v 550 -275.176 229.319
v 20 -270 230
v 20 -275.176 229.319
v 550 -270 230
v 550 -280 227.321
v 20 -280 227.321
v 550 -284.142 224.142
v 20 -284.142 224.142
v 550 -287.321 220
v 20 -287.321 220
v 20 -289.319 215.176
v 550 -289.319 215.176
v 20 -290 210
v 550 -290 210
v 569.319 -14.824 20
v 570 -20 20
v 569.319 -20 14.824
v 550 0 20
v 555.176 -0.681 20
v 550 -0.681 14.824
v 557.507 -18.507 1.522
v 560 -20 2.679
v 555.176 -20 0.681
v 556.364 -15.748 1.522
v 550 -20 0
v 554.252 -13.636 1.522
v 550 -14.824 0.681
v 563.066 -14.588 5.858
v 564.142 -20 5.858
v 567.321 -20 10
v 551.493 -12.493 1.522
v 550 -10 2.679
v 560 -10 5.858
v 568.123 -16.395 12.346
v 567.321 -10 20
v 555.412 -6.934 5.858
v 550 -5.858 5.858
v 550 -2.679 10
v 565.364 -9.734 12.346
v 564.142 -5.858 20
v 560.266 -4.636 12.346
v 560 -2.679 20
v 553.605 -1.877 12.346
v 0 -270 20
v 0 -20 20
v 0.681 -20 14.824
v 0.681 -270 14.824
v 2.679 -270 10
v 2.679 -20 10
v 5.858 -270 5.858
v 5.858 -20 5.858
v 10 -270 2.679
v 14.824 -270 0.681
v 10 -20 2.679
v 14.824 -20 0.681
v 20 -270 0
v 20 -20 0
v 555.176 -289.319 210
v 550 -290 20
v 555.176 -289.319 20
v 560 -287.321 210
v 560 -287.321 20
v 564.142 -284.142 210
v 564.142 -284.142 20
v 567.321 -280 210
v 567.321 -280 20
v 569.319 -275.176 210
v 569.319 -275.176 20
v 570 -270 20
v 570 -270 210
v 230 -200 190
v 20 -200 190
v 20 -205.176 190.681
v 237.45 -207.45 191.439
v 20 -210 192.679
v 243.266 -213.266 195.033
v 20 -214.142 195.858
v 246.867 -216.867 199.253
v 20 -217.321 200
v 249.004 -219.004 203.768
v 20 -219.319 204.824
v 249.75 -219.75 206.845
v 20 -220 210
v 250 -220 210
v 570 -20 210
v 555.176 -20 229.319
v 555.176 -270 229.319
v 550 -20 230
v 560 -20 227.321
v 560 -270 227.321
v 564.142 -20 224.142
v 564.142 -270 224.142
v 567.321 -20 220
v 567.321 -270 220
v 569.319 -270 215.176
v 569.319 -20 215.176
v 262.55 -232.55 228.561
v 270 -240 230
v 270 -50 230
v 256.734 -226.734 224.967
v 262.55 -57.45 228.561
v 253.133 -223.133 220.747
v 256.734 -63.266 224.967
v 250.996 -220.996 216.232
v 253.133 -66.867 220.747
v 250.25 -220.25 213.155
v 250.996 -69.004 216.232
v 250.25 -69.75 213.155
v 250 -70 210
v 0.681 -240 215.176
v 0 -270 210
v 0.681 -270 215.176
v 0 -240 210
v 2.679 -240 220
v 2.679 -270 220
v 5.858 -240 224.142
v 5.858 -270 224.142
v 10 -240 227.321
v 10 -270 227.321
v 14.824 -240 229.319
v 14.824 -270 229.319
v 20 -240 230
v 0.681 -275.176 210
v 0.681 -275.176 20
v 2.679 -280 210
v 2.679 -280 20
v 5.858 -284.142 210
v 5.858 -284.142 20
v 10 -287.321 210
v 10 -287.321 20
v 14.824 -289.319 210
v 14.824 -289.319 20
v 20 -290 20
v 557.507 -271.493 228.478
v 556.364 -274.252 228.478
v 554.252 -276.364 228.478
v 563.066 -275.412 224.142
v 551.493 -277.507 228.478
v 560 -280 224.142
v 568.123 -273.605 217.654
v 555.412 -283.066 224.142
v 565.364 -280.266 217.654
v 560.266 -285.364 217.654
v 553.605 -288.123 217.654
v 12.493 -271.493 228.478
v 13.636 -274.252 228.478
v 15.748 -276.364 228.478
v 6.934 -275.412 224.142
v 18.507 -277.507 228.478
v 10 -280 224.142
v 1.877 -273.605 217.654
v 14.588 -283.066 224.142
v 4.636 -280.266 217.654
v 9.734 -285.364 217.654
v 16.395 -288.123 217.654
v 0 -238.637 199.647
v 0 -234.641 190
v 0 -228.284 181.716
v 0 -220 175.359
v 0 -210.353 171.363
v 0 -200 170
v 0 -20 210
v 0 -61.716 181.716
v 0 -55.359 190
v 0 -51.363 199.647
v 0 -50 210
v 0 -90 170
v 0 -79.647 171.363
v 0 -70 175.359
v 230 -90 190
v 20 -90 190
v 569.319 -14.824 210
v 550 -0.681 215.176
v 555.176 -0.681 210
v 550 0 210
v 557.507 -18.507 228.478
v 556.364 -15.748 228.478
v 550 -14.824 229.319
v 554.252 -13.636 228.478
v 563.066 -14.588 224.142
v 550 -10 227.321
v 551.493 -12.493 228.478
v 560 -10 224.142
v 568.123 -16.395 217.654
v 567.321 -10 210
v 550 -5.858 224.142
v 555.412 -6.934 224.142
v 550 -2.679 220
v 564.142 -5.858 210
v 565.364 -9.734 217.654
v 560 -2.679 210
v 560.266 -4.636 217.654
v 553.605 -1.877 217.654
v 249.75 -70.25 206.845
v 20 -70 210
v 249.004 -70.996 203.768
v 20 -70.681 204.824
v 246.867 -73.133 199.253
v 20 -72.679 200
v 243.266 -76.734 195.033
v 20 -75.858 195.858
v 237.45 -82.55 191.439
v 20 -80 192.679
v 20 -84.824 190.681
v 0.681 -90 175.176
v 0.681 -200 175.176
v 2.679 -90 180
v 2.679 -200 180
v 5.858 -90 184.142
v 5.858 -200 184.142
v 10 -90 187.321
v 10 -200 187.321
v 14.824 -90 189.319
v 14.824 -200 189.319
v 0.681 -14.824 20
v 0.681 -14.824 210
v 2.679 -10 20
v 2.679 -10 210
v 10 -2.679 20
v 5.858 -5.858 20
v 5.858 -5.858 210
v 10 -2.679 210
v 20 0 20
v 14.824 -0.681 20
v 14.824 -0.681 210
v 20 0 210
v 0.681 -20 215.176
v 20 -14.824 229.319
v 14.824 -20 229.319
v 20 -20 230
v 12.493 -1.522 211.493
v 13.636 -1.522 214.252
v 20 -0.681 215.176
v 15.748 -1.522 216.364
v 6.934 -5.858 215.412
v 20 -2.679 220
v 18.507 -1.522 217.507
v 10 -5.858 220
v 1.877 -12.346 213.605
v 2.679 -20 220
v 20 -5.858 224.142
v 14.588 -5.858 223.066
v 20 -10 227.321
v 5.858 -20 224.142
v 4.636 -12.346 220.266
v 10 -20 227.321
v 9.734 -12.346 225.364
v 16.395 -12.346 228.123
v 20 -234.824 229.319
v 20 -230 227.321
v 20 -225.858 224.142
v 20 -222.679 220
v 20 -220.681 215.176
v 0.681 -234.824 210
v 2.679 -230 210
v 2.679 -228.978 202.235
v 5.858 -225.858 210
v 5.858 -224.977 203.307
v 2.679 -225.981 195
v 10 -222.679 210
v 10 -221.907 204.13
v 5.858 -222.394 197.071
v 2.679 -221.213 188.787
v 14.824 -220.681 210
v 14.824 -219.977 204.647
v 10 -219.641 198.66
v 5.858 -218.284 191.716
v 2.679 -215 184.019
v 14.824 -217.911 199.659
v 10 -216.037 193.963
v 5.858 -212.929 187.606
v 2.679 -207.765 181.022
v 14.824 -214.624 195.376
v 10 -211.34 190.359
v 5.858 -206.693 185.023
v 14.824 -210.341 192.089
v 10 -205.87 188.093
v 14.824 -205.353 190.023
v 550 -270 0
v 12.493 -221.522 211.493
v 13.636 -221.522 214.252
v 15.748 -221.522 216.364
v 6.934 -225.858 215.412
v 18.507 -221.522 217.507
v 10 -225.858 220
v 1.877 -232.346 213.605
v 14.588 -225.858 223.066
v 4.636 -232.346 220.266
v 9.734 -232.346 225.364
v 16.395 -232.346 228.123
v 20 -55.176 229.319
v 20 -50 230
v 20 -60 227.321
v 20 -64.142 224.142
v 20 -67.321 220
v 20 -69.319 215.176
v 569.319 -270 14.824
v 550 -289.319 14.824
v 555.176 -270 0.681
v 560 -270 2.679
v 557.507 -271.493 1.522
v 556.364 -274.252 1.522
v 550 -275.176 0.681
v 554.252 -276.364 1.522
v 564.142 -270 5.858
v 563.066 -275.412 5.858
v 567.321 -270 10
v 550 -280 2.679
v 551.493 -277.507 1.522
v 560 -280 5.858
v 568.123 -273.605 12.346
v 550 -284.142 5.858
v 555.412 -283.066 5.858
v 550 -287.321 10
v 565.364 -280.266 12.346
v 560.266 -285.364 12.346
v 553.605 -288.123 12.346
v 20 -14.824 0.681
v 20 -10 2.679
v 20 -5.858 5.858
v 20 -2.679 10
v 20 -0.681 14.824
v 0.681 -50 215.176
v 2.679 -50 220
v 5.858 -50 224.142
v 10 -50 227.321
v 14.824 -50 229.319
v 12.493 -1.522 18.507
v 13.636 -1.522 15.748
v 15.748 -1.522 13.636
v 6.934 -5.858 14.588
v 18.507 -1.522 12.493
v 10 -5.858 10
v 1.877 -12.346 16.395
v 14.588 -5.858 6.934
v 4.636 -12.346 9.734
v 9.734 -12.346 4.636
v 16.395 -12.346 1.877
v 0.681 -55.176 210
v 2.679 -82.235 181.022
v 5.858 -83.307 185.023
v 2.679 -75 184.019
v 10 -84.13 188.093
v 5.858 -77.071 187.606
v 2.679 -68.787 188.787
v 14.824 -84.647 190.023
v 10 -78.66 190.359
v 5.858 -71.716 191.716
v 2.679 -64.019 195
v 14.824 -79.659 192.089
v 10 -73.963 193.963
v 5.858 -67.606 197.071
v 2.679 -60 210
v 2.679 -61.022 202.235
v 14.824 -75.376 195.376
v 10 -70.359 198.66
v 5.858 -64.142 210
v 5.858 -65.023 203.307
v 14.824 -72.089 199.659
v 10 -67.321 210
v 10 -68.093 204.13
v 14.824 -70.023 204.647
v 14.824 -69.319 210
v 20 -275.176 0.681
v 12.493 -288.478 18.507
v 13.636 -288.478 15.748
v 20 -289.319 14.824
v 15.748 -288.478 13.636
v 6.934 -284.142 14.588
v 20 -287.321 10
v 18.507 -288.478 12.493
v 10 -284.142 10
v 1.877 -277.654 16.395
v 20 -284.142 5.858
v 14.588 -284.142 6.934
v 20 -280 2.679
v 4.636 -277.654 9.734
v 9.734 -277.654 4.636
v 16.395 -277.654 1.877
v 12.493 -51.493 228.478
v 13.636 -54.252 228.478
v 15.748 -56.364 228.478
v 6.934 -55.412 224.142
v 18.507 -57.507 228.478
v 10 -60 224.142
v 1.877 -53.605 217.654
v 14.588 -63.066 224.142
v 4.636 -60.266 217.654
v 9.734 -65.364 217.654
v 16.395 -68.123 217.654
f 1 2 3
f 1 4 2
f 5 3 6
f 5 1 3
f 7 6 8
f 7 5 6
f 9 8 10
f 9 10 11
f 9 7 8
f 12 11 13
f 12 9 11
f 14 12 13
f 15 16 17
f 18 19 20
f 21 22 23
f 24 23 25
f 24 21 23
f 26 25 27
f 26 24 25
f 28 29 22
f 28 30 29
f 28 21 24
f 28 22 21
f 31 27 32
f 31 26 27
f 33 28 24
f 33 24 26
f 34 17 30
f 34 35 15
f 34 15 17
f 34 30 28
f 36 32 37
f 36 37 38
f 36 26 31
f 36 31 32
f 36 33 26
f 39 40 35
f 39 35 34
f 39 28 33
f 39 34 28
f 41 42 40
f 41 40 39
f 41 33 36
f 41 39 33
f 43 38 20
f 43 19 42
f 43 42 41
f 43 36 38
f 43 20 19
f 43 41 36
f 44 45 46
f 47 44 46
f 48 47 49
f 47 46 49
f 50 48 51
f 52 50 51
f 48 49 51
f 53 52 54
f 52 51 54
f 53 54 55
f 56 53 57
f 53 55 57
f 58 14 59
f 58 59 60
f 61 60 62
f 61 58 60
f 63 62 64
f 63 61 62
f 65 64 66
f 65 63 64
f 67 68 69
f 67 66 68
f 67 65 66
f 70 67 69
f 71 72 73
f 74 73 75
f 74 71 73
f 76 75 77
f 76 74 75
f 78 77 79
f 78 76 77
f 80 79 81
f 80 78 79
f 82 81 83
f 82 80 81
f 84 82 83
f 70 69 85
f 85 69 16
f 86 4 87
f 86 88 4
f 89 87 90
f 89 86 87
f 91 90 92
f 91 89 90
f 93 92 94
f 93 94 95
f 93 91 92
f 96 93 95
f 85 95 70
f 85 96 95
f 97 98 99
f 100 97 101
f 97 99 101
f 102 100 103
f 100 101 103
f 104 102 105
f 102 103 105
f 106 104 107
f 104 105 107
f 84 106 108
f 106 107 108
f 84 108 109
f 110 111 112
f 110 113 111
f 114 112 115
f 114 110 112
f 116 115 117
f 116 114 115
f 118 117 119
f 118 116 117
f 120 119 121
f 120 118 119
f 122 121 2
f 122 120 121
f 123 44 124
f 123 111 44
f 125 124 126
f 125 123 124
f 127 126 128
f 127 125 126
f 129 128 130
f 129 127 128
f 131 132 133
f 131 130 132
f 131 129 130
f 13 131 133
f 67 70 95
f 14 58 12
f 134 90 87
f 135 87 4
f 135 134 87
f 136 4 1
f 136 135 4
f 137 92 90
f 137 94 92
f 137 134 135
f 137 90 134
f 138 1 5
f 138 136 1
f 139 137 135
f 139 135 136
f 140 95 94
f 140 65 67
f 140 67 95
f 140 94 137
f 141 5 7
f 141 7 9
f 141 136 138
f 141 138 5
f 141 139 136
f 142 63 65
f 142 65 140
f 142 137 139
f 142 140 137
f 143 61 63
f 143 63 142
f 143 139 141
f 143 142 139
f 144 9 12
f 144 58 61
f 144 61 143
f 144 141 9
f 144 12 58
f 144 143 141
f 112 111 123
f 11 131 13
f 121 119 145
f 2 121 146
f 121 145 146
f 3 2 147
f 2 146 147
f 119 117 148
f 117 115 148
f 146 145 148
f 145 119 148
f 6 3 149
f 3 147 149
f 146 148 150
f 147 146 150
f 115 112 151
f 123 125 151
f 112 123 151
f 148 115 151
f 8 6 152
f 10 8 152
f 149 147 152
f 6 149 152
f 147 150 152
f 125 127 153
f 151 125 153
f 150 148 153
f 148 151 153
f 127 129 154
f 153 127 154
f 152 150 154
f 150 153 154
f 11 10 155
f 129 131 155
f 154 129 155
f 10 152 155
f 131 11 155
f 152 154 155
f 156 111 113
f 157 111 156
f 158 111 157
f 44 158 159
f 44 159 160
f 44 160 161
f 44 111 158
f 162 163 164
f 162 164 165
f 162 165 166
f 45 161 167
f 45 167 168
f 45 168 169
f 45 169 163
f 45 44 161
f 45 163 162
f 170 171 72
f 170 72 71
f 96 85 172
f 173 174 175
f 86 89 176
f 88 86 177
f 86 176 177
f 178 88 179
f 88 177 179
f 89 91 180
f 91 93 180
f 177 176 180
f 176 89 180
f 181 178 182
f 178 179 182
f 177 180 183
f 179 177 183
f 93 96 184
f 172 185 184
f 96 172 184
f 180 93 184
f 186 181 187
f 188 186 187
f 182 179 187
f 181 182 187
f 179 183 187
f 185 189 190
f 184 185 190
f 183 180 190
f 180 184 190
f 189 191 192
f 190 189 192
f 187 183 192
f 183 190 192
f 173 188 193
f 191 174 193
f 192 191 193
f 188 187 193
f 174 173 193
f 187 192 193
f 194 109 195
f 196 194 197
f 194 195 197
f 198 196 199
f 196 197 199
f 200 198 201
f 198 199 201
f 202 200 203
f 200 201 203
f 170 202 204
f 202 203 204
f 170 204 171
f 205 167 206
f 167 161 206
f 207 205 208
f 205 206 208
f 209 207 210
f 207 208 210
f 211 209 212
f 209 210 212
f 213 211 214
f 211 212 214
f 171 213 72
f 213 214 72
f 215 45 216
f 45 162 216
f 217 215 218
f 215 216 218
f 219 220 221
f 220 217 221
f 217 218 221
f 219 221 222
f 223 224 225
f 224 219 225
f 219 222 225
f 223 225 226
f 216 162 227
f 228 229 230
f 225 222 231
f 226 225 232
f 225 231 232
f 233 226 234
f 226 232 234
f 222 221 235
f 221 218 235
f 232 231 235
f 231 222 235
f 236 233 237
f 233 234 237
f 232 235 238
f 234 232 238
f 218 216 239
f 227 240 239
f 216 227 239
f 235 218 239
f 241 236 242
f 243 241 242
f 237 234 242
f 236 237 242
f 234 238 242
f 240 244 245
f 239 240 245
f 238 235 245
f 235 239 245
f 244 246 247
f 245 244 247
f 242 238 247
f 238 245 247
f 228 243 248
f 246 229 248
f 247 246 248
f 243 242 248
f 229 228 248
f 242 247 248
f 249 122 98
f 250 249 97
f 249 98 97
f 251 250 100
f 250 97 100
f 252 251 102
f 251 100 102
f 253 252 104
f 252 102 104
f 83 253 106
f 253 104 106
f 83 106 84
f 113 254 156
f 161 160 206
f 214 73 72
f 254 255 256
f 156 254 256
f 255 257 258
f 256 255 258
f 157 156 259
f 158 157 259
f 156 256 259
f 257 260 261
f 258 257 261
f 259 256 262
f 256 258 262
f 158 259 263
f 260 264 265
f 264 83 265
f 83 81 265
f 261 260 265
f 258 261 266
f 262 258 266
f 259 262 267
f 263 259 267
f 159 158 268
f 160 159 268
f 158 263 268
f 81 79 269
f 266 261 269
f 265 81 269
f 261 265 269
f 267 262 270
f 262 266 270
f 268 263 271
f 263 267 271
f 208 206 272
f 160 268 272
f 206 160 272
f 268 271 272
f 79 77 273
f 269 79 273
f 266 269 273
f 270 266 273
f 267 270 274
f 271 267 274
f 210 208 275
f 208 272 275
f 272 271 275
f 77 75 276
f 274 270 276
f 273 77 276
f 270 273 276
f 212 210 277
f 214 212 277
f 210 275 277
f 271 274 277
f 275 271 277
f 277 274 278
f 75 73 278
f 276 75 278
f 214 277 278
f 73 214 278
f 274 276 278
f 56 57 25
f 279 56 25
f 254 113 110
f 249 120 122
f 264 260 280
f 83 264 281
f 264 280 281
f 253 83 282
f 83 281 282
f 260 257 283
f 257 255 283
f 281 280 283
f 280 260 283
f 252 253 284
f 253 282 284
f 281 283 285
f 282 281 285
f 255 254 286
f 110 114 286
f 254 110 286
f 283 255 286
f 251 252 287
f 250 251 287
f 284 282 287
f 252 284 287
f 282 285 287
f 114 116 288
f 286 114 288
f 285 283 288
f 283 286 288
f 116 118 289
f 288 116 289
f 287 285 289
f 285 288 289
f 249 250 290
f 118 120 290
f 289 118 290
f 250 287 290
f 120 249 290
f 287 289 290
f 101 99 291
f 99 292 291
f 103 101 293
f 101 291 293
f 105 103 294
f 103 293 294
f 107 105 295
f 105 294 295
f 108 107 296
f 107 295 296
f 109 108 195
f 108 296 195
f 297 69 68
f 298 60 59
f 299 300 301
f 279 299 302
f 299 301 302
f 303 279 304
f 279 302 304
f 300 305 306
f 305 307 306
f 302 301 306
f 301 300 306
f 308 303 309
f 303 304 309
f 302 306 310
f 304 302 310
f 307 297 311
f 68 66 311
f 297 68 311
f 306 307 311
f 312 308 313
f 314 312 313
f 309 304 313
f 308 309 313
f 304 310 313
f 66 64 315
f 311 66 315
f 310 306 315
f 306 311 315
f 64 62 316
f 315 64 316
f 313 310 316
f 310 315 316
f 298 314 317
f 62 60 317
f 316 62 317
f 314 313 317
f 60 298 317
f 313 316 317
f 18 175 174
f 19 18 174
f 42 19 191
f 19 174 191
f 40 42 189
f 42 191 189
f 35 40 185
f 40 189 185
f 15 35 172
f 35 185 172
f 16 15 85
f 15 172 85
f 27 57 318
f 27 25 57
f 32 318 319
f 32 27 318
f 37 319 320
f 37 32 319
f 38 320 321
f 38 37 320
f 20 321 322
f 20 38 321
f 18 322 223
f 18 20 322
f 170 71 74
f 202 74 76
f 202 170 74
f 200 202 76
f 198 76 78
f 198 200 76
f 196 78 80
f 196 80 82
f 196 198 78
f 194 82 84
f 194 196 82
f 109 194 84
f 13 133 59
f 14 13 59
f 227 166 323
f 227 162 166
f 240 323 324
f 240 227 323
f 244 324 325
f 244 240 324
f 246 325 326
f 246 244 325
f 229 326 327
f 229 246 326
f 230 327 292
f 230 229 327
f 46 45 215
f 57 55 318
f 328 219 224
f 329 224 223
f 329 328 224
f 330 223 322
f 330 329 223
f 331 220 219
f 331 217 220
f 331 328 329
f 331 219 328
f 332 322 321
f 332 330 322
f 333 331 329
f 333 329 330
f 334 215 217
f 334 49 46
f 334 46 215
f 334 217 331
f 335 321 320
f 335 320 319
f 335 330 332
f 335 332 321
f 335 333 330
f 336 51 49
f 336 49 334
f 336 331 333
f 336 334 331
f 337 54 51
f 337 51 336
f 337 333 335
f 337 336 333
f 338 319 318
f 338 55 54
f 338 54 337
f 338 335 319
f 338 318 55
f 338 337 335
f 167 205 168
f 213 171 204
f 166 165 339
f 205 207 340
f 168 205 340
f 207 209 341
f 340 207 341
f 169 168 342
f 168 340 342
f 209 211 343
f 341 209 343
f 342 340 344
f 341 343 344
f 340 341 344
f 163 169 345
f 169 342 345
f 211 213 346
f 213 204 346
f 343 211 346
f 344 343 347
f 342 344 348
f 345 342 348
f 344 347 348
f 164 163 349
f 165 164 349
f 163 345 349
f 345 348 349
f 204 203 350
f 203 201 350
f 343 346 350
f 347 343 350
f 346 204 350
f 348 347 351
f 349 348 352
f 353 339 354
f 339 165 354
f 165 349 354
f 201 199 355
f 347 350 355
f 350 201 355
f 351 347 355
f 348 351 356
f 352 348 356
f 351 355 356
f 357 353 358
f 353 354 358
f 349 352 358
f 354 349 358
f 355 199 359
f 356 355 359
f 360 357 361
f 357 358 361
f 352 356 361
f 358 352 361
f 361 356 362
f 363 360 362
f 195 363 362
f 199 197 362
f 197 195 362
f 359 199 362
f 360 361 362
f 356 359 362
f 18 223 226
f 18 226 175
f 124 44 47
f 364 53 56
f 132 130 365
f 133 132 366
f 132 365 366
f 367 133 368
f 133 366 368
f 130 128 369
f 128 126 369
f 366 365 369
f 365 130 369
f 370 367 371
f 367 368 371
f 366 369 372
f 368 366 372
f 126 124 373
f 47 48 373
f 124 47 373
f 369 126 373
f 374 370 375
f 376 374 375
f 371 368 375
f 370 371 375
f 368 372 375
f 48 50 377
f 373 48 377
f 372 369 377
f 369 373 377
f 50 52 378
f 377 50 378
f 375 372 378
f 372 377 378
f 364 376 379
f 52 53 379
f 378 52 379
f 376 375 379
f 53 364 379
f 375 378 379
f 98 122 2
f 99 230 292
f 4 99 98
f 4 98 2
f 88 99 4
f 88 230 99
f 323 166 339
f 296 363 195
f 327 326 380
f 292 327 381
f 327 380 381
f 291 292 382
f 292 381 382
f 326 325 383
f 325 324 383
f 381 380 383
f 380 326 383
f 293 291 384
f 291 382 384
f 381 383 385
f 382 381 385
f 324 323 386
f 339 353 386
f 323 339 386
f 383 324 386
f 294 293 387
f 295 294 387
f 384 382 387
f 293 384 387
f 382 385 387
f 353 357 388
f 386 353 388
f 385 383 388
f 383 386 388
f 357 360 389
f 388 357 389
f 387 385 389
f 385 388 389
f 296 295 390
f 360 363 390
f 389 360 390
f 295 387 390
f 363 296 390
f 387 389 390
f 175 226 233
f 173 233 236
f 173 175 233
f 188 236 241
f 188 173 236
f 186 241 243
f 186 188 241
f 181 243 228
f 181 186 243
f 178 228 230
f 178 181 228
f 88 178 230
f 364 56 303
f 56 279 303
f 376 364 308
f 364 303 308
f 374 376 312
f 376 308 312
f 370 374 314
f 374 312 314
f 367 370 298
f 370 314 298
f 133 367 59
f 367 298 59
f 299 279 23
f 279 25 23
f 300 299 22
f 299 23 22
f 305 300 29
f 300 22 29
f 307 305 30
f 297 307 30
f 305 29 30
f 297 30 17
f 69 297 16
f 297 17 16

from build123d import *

# Parameters (mm, degrees)
F0_W     = 570
F0_H     = 290
F1_DEPTH = 230
F3_DEPTH = 40
F4_R     = 19.99999


# Not quite as in the source:
# - a fillet or chamfer is up to 0.001 mm smaller than in the source, because OpenCascade refuses the exact size
# - a feature of the source that left no trace in its solid (it failed there, or was rolled back) is left out


with BuildPart() as f1:
    # F0 (on Top) → F1 (new body)
    with BuildSketch(Plane.XY):
        with Locations((285, -145)):
            Rectangle(F0_W, F0_H)
    extrude(amount=F1_DEPTH)

    # F2 (on face) → F3 (cut)
    with BuildSketch(Plane.XY.offset(230)):
        Polygon((0, -220), (250, -220), (250, -145), (250, -70), (0, -70), (0, -145), align=None)
    extrude(amount=-F3_DEPTH, mode=Mode.SUBTRACT)

    # F4 (radius 20 in the source; OpenCascade refuses exactly that, so slightly less here)
    f4_edges = [f1.edges().sort_by_distance(p)[0] for p in [
        (0, -145, 0),
        (0, -290, 115),
        (0, -255, 230),
        (0, -220, 210),
        (0, -145, 190),
        (0, -70, 210),
        (0, -35, 230),
        (0, 0, 115),
        (570, -290, 115),
        (570, 0, 115),
        (570, -145, 0),
        (570, -145, 230),
        (285, -290, 0),
        (285, -290, 230),
        (285, 0, 0),
        (285, 0, 230),
        (125, -220, 190),
        (250, -145, 190),
        (125, -70, 190),
        (125, -220, 230),
        (250, -145, 230),
        (125, -70, 230),
    ]]
    fillet(f4_edges, radius=F4_R)


solid = f1.part
